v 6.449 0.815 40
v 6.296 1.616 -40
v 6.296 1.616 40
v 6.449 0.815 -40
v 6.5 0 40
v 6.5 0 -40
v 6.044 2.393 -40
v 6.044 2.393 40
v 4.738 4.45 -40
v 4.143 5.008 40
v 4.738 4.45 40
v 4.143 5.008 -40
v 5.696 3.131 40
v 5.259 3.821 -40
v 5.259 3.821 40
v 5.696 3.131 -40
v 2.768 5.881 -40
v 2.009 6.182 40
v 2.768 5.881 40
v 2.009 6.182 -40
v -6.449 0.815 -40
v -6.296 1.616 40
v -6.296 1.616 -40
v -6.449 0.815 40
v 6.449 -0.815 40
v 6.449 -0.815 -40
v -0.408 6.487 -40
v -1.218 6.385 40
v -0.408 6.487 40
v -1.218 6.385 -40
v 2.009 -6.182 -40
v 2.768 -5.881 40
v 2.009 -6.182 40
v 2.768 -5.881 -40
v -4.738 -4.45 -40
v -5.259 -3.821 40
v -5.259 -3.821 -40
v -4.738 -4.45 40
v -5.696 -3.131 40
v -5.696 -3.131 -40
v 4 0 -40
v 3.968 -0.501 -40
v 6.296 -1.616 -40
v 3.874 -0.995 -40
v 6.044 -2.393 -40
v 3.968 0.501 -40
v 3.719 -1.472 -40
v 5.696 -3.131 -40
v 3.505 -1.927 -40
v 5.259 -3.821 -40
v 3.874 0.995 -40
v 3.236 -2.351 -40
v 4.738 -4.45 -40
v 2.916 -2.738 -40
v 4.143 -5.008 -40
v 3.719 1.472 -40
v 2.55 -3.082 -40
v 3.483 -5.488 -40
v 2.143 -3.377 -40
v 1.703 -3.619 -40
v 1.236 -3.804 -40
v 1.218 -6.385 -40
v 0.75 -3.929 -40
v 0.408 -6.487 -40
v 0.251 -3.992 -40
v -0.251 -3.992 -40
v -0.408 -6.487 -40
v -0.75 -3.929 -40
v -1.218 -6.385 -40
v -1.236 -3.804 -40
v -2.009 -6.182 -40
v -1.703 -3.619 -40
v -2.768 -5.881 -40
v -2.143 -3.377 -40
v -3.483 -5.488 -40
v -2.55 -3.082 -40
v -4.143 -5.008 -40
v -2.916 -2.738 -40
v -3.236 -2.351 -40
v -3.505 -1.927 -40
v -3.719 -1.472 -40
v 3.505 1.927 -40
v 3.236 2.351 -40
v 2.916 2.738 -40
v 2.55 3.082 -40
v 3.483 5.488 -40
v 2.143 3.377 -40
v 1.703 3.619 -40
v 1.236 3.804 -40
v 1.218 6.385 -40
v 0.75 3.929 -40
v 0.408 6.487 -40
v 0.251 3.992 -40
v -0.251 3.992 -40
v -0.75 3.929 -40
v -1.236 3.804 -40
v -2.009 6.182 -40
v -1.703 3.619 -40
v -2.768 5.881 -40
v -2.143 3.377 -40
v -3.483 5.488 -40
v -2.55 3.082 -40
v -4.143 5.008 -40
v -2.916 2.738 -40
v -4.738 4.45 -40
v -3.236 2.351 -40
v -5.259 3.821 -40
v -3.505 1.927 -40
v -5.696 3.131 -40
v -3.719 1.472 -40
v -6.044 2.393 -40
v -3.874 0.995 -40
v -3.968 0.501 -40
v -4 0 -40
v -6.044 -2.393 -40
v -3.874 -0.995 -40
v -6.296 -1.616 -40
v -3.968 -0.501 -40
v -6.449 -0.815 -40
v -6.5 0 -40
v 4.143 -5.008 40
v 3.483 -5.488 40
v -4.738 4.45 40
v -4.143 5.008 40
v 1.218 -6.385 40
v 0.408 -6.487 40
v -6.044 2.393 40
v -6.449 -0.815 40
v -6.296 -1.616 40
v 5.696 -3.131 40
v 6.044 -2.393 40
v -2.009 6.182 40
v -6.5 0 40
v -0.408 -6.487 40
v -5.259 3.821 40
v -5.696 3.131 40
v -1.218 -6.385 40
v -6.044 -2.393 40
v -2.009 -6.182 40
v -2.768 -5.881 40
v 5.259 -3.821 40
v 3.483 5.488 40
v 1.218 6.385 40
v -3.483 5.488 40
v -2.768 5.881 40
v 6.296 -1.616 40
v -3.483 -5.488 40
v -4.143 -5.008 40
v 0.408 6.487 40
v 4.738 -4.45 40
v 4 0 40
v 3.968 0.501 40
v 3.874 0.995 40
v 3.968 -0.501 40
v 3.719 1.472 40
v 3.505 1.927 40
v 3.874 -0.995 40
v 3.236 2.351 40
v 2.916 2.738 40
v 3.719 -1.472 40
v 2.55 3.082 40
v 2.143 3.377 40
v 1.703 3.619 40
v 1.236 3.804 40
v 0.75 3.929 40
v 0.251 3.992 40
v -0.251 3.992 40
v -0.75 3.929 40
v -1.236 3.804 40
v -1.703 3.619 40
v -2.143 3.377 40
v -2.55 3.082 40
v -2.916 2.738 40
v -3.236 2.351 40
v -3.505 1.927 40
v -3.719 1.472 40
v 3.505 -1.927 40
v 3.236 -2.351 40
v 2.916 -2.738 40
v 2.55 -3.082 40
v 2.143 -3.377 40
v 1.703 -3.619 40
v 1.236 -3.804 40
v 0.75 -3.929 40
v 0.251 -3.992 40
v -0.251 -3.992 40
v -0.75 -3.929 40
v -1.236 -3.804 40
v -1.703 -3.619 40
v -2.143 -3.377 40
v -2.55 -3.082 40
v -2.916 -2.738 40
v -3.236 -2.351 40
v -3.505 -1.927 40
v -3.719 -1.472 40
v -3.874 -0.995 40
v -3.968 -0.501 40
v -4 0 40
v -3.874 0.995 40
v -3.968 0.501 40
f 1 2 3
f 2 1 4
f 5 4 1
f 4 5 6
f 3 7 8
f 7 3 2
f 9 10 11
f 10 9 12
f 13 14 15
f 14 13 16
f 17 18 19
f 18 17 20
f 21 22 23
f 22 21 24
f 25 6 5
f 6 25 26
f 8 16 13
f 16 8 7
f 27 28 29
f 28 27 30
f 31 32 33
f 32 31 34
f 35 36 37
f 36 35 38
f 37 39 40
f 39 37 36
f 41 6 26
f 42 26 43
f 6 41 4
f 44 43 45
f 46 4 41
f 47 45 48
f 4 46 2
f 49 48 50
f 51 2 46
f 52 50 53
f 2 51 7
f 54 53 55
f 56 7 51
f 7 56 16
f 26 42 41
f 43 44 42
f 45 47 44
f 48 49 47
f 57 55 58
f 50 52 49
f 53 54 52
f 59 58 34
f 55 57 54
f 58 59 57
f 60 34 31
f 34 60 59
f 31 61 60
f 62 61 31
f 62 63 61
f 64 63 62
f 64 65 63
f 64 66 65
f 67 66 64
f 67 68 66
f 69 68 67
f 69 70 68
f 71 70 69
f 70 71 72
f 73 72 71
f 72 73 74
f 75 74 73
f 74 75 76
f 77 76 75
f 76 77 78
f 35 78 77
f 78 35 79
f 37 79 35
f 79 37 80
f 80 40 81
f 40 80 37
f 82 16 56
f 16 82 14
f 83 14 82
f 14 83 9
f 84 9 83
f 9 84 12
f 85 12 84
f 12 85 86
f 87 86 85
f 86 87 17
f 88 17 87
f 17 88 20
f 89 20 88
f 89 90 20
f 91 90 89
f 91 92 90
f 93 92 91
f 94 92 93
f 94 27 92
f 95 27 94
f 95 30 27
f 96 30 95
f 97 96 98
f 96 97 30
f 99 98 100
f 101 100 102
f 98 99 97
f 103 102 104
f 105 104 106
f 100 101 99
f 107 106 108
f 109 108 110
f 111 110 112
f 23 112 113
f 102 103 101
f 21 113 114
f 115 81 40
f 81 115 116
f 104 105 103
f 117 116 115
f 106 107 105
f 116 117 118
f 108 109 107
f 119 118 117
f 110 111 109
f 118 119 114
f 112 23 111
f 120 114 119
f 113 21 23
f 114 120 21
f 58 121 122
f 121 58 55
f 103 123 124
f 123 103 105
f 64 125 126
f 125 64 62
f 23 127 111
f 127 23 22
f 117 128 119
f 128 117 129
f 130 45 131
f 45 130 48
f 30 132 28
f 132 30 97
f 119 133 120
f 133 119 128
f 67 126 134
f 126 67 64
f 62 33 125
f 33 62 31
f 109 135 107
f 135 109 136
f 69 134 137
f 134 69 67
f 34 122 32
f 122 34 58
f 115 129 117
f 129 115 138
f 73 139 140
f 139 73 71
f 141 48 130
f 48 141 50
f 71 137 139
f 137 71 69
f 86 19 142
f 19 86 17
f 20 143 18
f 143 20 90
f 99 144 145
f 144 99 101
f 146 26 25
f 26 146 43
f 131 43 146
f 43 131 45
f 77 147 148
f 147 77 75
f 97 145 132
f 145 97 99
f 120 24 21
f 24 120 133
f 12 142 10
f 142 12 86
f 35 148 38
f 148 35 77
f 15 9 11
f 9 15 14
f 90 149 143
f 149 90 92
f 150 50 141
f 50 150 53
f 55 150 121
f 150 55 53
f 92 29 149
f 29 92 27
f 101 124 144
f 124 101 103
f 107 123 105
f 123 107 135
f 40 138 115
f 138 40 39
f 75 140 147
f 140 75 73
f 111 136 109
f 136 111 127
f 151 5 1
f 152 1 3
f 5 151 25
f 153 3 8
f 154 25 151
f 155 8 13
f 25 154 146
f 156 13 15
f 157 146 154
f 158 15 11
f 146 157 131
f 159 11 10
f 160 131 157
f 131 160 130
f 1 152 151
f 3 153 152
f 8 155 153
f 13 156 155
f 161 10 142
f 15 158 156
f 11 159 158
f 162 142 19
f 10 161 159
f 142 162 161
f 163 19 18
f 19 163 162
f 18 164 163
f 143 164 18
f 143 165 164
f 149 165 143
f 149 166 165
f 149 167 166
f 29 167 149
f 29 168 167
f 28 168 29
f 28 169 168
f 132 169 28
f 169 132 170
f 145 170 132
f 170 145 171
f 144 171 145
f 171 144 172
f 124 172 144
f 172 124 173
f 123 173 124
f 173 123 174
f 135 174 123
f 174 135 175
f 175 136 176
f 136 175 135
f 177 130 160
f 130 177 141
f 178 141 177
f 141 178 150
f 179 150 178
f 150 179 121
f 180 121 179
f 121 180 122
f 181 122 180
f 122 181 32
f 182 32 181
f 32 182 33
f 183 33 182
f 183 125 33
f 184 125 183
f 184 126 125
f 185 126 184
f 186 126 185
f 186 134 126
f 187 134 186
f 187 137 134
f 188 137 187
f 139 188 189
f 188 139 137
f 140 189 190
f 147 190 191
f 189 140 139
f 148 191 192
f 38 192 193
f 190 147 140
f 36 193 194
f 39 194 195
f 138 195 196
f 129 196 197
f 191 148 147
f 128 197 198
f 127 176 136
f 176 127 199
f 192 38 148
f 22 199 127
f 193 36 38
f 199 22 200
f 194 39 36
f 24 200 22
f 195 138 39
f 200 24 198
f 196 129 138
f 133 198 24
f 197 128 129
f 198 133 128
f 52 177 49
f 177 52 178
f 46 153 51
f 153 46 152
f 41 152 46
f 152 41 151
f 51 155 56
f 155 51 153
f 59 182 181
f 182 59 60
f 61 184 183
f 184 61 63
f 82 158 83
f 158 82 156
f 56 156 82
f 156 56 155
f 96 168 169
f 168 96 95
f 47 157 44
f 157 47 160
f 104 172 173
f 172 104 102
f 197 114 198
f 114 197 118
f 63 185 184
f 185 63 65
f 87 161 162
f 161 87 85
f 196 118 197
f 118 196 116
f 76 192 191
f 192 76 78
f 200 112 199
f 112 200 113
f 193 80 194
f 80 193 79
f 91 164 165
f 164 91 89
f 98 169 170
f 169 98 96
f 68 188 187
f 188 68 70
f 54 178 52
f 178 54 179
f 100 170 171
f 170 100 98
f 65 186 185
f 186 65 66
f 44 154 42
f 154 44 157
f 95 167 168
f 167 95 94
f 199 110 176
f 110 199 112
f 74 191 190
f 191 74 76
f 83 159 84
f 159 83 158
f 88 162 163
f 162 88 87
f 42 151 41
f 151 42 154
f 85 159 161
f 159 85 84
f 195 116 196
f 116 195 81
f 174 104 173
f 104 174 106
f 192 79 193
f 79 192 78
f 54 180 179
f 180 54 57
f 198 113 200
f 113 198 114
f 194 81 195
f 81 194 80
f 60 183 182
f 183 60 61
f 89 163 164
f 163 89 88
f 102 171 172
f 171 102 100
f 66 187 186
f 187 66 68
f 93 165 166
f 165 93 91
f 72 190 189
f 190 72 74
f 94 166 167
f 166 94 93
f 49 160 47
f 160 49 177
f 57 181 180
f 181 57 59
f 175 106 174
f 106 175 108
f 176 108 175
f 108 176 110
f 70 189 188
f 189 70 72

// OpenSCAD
$fn = 50;


difference() {
	union() {
		translate(v = [0, 0, -40.0000000000]) {
			cylinder(h = 80, r = 6.5000000000);
		}
	}
	union() {
		translate(v = [0, 0, -100.0000000000]) {
			cylinder(h = 200, r = 4.0000000000);
		}
	}
}
